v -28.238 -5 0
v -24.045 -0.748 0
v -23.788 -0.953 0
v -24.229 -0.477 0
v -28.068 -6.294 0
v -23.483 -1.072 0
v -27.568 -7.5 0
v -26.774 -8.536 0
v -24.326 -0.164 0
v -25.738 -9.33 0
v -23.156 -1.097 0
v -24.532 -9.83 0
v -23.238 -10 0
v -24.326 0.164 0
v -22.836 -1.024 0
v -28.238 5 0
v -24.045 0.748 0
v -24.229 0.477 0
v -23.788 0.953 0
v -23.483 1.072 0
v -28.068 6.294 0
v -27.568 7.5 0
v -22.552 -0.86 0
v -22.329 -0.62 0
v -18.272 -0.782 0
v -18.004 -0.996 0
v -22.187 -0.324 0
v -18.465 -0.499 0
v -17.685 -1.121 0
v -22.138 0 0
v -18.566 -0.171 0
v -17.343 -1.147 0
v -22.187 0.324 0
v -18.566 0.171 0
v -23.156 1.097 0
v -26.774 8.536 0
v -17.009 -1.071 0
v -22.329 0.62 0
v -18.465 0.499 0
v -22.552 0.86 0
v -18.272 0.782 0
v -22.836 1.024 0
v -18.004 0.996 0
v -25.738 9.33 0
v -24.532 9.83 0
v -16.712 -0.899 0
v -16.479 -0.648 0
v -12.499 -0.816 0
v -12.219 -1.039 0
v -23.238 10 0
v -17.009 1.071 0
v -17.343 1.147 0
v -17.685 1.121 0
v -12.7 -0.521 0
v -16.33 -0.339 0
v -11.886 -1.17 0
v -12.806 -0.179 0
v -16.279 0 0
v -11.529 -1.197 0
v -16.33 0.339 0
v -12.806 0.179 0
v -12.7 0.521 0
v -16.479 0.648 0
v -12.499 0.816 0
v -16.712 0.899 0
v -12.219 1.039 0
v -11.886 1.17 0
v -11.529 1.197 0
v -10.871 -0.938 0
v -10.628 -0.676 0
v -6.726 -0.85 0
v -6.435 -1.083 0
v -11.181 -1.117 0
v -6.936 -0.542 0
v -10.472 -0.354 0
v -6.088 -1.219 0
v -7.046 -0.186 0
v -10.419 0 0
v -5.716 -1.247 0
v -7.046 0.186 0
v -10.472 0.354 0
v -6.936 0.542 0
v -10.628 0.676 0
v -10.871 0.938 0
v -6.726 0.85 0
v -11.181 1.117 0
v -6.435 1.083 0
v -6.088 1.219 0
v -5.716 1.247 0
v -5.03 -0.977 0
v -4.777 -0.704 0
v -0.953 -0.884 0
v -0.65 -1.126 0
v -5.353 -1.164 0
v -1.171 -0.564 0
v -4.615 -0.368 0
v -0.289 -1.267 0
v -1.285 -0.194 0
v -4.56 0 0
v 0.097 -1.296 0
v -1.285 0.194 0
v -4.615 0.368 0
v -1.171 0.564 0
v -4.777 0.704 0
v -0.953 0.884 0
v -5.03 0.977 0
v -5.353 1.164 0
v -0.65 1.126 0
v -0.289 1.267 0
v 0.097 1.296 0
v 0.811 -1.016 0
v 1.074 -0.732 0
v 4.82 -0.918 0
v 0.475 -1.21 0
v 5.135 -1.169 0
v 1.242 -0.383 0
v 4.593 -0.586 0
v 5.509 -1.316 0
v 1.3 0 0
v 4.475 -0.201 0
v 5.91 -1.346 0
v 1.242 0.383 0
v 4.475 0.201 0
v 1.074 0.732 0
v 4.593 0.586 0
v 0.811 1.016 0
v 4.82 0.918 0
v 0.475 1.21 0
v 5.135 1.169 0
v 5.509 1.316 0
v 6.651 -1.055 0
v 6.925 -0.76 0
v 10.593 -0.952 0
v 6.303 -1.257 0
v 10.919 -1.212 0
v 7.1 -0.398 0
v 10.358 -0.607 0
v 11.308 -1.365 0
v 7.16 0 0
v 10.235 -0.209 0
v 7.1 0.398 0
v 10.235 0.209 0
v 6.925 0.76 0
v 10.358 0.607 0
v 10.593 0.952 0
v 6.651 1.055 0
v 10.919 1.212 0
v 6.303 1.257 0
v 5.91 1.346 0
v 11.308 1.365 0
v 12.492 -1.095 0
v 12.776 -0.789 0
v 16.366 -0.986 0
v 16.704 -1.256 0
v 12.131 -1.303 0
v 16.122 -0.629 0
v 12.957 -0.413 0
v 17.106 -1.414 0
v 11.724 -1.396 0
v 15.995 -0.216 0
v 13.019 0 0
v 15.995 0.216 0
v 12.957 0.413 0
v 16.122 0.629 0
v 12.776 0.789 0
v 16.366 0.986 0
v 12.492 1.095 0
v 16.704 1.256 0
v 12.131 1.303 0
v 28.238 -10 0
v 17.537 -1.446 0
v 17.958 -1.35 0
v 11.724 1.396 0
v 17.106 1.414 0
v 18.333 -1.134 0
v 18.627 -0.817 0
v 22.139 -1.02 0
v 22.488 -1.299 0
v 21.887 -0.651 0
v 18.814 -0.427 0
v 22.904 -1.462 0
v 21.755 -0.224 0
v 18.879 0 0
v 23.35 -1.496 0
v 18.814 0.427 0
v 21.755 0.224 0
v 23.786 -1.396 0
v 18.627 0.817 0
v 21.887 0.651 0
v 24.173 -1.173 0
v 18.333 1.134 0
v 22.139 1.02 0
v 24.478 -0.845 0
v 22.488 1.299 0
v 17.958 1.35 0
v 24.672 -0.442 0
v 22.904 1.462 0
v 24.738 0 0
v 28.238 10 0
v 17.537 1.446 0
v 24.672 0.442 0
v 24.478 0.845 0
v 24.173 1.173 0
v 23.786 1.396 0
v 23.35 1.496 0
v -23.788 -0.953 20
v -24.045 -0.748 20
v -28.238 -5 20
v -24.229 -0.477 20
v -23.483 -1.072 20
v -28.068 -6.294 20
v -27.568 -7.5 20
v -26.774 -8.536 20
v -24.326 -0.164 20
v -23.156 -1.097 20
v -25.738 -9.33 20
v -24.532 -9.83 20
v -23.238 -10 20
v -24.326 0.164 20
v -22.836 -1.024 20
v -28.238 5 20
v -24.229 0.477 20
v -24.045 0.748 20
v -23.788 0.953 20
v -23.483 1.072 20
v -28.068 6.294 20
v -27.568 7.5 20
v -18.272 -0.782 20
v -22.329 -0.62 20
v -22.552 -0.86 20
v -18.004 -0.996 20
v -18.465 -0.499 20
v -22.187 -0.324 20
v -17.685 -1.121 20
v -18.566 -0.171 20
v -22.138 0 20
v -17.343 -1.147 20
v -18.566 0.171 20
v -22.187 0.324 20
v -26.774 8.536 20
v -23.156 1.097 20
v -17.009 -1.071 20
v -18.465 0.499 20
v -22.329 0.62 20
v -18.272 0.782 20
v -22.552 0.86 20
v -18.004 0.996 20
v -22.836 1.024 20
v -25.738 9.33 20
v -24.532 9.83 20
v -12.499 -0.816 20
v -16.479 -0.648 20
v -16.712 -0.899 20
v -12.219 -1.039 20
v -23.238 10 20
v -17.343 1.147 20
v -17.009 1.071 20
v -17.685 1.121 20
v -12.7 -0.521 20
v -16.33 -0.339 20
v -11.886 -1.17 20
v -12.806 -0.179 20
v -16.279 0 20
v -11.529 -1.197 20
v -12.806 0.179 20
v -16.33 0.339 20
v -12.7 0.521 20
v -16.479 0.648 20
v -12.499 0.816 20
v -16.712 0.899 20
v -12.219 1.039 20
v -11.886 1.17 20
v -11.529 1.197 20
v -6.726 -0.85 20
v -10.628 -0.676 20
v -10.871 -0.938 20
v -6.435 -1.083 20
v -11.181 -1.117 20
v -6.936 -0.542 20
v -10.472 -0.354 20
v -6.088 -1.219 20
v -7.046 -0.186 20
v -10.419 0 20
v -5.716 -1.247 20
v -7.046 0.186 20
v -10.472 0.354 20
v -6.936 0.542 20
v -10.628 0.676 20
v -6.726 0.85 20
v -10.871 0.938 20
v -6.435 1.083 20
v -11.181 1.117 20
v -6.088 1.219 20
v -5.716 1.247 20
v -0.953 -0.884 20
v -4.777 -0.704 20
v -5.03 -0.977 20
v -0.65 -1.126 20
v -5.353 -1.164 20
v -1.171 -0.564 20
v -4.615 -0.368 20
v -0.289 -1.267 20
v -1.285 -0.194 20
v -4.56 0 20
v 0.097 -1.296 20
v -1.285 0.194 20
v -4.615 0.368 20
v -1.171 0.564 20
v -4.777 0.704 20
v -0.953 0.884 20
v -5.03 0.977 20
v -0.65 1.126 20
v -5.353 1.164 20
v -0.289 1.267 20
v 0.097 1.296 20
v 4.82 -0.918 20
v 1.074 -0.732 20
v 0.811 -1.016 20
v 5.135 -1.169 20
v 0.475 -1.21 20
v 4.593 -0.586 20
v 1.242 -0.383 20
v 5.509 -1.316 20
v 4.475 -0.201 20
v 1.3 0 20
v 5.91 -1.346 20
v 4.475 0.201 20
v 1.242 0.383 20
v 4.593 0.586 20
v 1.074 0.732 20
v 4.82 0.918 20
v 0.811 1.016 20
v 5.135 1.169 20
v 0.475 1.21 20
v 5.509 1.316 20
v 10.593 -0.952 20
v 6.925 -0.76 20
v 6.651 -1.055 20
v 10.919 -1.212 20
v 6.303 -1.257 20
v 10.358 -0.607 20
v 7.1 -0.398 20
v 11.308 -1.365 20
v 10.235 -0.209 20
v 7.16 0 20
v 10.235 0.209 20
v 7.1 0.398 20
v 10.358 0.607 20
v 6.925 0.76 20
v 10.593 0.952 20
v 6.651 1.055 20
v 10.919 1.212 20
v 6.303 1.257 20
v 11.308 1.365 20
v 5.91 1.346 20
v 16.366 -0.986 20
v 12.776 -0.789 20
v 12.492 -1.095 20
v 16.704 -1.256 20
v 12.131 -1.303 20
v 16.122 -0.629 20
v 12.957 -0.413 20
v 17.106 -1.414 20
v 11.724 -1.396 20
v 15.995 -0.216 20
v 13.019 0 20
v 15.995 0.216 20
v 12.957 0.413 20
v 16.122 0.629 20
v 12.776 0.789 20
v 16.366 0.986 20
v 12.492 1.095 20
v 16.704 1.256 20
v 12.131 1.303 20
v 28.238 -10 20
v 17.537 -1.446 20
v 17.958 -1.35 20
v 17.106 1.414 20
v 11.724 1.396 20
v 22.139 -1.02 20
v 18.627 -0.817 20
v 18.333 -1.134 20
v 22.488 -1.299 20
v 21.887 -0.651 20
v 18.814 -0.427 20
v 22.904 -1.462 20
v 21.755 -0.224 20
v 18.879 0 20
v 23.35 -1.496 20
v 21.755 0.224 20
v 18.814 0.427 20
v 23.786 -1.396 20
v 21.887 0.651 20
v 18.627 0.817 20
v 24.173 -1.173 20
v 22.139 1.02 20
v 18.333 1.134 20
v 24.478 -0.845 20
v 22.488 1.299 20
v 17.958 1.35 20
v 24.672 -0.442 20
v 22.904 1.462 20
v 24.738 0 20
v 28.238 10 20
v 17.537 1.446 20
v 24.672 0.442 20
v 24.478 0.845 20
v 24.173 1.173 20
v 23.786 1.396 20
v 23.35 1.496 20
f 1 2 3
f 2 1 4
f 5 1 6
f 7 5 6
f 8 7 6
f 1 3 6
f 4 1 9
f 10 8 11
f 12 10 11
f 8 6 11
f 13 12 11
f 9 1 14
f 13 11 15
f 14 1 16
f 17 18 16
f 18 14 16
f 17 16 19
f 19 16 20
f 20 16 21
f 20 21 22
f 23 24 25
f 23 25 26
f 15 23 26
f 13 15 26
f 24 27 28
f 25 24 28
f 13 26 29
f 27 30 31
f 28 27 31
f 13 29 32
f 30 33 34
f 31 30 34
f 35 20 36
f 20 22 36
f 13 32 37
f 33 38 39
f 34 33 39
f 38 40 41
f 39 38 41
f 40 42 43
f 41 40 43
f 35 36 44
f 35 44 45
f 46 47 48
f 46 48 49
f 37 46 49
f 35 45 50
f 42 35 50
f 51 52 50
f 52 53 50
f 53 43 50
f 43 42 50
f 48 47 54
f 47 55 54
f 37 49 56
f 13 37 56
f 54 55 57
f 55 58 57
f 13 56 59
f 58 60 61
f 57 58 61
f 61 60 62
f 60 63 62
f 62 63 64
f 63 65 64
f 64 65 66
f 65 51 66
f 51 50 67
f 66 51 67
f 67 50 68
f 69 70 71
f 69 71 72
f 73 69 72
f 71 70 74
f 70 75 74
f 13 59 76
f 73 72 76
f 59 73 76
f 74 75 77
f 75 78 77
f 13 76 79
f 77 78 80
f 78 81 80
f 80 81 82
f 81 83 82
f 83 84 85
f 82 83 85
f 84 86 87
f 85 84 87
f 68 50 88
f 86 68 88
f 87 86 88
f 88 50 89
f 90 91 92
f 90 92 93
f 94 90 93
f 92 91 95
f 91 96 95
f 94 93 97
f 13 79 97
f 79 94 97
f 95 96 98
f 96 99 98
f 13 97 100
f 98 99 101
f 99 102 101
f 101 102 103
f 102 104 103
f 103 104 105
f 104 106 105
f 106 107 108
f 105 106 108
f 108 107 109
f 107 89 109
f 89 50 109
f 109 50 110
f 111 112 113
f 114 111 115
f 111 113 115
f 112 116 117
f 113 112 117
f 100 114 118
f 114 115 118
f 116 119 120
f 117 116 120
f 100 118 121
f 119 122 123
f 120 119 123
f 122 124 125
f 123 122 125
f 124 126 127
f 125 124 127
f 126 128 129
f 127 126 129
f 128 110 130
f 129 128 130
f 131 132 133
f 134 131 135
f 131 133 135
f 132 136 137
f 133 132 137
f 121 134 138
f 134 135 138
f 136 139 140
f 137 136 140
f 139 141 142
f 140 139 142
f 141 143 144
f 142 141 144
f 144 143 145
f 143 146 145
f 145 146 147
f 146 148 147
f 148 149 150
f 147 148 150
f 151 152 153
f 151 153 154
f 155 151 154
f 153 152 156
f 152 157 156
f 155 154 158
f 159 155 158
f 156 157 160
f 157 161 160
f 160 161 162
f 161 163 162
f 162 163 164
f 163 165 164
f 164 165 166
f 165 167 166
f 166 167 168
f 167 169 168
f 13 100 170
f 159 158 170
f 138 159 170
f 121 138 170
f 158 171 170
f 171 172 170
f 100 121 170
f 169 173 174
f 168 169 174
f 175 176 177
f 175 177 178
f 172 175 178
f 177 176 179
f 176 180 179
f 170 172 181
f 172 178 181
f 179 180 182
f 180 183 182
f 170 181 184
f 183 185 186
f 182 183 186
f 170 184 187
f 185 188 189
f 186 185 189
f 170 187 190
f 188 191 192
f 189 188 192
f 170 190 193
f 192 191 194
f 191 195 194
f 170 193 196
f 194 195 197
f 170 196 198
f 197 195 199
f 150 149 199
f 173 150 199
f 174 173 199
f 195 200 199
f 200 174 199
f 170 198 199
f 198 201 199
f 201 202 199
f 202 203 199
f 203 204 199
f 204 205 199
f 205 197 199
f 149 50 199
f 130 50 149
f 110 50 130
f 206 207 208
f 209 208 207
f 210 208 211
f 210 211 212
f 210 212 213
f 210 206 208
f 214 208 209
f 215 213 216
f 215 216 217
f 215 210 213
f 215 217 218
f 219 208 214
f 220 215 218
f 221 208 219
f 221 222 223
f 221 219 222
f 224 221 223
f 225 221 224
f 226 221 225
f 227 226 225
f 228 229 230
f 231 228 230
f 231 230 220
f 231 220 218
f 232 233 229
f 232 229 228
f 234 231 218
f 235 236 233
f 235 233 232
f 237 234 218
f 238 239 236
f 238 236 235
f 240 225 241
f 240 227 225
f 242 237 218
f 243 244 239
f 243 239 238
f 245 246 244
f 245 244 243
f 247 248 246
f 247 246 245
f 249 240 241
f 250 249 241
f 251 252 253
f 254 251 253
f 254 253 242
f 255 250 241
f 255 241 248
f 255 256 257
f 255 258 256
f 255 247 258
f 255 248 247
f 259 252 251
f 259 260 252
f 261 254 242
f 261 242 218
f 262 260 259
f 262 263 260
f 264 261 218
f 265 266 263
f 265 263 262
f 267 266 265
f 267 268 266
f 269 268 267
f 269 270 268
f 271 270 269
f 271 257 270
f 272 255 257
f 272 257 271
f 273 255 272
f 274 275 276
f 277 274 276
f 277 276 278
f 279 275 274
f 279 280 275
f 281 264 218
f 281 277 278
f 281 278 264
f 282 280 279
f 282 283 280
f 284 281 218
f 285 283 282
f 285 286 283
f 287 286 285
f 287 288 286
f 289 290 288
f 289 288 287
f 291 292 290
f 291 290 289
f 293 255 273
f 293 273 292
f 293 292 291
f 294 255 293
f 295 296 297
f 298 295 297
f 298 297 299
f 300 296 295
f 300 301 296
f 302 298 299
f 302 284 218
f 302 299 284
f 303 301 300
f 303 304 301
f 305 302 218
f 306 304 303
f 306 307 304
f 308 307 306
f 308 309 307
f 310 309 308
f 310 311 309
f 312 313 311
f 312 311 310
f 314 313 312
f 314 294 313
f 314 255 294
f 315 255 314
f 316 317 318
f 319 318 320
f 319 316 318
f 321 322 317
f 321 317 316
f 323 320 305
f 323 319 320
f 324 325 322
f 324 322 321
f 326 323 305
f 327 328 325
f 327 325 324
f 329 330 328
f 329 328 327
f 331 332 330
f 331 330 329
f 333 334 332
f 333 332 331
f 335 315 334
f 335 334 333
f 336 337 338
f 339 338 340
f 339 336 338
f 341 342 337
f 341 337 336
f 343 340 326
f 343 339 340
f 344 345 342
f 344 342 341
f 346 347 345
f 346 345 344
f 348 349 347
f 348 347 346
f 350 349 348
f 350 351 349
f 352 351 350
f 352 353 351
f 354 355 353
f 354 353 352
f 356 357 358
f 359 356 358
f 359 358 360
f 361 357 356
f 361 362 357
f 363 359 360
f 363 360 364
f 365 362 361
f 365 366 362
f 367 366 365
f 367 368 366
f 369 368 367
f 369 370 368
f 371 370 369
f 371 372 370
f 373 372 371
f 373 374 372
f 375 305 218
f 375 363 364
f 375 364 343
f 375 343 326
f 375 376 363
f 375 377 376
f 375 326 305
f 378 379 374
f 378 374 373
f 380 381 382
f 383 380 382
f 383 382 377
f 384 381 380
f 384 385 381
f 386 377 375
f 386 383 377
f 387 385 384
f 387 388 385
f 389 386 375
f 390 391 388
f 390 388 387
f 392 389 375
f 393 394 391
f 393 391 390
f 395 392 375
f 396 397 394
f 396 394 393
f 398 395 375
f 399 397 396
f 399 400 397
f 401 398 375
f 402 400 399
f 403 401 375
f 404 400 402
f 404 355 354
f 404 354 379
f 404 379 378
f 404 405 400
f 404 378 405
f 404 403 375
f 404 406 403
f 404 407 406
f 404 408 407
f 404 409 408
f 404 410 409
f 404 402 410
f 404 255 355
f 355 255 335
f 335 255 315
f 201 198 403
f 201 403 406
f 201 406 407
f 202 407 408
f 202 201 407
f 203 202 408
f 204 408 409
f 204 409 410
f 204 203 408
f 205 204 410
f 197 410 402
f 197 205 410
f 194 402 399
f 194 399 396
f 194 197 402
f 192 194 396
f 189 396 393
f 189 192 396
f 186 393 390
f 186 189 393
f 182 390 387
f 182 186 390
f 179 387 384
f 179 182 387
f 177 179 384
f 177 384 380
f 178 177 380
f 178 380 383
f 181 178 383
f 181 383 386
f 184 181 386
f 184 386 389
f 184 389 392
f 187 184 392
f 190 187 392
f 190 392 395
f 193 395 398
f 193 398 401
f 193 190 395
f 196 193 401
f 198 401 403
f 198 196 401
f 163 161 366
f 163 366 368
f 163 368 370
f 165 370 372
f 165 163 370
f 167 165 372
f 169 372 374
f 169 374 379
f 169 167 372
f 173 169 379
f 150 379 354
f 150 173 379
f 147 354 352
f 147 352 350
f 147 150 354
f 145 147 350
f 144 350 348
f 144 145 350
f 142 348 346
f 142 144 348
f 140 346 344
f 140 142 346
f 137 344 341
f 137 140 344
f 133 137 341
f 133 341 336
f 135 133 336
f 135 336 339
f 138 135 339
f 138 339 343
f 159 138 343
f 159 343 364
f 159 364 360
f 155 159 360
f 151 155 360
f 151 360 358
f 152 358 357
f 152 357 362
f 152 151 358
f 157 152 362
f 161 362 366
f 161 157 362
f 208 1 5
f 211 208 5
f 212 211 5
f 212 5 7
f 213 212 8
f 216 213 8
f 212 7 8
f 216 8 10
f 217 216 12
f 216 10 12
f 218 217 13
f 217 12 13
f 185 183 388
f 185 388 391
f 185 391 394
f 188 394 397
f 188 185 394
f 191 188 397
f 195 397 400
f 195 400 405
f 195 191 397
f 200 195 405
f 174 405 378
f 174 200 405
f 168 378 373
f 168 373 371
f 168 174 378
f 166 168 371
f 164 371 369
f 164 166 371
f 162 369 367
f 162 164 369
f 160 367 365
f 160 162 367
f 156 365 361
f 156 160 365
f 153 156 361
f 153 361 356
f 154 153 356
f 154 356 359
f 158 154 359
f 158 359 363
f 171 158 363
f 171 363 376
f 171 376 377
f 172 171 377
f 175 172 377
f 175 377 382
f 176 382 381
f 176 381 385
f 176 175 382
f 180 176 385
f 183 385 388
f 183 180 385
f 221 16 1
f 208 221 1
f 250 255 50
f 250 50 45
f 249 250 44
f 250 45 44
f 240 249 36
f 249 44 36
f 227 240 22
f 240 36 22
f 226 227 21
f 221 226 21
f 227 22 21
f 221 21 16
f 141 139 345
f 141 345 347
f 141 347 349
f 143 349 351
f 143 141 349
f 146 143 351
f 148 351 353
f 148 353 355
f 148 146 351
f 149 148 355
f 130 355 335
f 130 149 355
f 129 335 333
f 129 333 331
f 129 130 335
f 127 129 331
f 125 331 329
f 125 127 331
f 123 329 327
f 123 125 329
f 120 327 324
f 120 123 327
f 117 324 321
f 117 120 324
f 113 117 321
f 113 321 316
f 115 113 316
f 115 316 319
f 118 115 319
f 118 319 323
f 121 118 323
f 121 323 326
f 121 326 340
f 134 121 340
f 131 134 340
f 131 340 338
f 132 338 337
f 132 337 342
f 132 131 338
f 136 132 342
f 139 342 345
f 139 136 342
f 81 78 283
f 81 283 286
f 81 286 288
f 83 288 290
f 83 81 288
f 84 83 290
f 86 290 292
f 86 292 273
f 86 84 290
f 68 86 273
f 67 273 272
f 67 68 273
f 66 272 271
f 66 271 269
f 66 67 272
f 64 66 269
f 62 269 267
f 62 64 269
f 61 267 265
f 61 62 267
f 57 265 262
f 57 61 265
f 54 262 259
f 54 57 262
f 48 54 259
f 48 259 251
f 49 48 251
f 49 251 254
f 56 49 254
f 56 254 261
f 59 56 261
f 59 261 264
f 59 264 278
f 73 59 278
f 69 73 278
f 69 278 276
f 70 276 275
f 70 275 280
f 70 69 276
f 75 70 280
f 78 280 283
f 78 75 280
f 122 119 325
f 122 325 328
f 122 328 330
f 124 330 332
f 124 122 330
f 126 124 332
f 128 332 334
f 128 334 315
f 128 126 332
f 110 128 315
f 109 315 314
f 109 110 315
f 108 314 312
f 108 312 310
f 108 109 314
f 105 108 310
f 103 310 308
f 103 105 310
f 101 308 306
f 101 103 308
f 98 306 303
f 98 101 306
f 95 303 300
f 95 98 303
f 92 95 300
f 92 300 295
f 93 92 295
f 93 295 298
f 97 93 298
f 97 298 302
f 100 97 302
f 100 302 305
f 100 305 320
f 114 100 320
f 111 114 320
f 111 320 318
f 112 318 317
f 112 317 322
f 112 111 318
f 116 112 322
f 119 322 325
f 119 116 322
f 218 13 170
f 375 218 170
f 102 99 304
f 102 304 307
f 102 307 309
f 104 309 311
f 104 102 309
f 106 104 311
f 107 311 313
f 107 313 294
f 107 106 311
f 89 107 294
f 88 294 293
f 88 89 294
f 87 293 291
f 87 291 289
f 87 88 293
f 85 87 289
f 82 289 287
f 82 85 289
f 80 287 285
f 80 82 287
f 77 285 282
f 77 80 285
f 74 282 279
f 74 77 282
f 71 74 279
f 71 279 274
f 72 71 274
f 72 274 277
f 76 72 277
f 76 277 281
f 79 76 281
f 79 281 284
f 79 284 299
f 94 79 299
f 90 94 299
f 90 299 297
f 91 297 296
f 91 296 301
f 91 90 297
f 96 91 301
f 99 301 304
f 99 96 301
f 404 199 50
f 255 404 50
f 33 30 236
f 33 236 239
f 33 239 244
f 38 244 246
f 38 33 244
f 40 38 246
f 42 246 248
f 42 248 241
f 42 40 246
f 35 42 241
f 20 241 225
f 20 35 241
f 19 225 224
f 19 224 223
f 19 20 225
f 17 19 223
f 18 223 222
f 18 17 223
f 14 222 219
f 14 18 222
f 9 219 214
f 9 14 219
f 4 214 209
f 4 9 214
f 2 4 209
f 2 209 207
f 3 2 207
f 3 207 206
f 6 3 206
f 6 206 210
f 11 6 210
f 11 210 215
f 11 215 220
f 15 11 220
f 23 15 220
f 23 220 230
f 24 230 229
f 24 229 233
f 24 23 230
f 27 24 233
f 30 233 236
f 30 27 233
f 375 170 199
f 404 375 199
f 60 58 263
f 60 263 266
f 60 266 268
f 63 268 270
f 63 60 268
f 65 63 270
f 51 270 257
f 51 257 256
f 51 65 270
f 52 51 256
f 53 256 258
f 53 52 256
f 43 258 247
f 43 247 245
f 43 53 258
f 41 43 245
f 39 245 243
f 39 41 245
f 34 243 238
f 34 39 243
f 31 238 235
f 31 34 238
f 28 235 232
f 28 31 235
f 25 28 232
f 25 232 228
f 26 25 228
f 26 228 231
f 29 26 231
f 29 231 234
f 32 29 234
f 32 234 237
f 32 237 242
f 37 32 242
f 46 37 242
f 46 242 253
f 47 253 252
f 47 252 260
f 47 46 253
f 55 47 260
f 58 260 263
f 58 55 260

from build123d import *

# Parameters (mm, degrees)
SKETCH1_R           = 1.1
SKETCH1_R_2         = 1.15
SKETCH1_R_3         = 1.2
SKETCH1_R_4         = 1.25
SKETCH1_R_5         = 1.3
SKETCH1_R_6         = 1.35
SKETCH1_R_7         = 1.4
SKETCH1_R_8         = 1.45
SKETCH1_R_9         = 1.5
BOSS_EXTRUDE1_DEPTH = 20


with BuildPart() as part:
    # Sketch1 → Boss-Extrude1 (new body)
    with BuildSketch(Plane.XY):
        with BuildLine():
            Line((-23.238249128, -10), (28.238249128, -10))
            Line((28.238249128, -10), (28.238249128, 10))
            Line((28.238249128, 10), (-23.238249128, 10))
            ThreePointArc((-23.238249128, 10), (-26.773783034, 8.535533906), (-28.238249128, 5))
            Line((-28.238249128, 5), (-28.238249128, -5))
            ThreePointArc((-28.238249128, -5), (-26.773783034, -8.535533906), (-23.238249128, -10))
        make_face()
        with Locations((-23.238249128, 0)):
            Circle(SKETCH1_R, mode=Mode.SUBTRACT)
        with Locations((-17.428686846, 0)):
            Circle(SKETCH1_R_2, mode=Mode.SUBTRACT)
        with Locations((-11.619124564, 0)):
            Circle(SKETCH1_R_3, mode=Mode.SUBTRACT)
        with Locations((-5.809562282, 0)):
            Circle(SKETCH1_R_4, mode=Mode.SUBTRACT)
        Circle(SKETCH1_R_5, mode=Mode.SUBTRACT)
        with Locations((5.809562282, 0)):
            Circle(SKETCH1_R_6, mode=Mode.SUBTRACT)
        with Locations((11.619124564, 0)):
            Circle(SKETCH1_R_7, mode=Mode.SUBTRACT)
        with Locations((17.428686846, 0)):
            Circle(SKETCH1_R_8, mode=Mode.SUBTRACT)
        with Locations((23.238249128, 0)):
            Circle(SKETCH1_R_9, mode=Mode.SUBTRACT)
    extrude(amount=BOSS_EXTRUDE1_DEPTH)


solid = part.part
